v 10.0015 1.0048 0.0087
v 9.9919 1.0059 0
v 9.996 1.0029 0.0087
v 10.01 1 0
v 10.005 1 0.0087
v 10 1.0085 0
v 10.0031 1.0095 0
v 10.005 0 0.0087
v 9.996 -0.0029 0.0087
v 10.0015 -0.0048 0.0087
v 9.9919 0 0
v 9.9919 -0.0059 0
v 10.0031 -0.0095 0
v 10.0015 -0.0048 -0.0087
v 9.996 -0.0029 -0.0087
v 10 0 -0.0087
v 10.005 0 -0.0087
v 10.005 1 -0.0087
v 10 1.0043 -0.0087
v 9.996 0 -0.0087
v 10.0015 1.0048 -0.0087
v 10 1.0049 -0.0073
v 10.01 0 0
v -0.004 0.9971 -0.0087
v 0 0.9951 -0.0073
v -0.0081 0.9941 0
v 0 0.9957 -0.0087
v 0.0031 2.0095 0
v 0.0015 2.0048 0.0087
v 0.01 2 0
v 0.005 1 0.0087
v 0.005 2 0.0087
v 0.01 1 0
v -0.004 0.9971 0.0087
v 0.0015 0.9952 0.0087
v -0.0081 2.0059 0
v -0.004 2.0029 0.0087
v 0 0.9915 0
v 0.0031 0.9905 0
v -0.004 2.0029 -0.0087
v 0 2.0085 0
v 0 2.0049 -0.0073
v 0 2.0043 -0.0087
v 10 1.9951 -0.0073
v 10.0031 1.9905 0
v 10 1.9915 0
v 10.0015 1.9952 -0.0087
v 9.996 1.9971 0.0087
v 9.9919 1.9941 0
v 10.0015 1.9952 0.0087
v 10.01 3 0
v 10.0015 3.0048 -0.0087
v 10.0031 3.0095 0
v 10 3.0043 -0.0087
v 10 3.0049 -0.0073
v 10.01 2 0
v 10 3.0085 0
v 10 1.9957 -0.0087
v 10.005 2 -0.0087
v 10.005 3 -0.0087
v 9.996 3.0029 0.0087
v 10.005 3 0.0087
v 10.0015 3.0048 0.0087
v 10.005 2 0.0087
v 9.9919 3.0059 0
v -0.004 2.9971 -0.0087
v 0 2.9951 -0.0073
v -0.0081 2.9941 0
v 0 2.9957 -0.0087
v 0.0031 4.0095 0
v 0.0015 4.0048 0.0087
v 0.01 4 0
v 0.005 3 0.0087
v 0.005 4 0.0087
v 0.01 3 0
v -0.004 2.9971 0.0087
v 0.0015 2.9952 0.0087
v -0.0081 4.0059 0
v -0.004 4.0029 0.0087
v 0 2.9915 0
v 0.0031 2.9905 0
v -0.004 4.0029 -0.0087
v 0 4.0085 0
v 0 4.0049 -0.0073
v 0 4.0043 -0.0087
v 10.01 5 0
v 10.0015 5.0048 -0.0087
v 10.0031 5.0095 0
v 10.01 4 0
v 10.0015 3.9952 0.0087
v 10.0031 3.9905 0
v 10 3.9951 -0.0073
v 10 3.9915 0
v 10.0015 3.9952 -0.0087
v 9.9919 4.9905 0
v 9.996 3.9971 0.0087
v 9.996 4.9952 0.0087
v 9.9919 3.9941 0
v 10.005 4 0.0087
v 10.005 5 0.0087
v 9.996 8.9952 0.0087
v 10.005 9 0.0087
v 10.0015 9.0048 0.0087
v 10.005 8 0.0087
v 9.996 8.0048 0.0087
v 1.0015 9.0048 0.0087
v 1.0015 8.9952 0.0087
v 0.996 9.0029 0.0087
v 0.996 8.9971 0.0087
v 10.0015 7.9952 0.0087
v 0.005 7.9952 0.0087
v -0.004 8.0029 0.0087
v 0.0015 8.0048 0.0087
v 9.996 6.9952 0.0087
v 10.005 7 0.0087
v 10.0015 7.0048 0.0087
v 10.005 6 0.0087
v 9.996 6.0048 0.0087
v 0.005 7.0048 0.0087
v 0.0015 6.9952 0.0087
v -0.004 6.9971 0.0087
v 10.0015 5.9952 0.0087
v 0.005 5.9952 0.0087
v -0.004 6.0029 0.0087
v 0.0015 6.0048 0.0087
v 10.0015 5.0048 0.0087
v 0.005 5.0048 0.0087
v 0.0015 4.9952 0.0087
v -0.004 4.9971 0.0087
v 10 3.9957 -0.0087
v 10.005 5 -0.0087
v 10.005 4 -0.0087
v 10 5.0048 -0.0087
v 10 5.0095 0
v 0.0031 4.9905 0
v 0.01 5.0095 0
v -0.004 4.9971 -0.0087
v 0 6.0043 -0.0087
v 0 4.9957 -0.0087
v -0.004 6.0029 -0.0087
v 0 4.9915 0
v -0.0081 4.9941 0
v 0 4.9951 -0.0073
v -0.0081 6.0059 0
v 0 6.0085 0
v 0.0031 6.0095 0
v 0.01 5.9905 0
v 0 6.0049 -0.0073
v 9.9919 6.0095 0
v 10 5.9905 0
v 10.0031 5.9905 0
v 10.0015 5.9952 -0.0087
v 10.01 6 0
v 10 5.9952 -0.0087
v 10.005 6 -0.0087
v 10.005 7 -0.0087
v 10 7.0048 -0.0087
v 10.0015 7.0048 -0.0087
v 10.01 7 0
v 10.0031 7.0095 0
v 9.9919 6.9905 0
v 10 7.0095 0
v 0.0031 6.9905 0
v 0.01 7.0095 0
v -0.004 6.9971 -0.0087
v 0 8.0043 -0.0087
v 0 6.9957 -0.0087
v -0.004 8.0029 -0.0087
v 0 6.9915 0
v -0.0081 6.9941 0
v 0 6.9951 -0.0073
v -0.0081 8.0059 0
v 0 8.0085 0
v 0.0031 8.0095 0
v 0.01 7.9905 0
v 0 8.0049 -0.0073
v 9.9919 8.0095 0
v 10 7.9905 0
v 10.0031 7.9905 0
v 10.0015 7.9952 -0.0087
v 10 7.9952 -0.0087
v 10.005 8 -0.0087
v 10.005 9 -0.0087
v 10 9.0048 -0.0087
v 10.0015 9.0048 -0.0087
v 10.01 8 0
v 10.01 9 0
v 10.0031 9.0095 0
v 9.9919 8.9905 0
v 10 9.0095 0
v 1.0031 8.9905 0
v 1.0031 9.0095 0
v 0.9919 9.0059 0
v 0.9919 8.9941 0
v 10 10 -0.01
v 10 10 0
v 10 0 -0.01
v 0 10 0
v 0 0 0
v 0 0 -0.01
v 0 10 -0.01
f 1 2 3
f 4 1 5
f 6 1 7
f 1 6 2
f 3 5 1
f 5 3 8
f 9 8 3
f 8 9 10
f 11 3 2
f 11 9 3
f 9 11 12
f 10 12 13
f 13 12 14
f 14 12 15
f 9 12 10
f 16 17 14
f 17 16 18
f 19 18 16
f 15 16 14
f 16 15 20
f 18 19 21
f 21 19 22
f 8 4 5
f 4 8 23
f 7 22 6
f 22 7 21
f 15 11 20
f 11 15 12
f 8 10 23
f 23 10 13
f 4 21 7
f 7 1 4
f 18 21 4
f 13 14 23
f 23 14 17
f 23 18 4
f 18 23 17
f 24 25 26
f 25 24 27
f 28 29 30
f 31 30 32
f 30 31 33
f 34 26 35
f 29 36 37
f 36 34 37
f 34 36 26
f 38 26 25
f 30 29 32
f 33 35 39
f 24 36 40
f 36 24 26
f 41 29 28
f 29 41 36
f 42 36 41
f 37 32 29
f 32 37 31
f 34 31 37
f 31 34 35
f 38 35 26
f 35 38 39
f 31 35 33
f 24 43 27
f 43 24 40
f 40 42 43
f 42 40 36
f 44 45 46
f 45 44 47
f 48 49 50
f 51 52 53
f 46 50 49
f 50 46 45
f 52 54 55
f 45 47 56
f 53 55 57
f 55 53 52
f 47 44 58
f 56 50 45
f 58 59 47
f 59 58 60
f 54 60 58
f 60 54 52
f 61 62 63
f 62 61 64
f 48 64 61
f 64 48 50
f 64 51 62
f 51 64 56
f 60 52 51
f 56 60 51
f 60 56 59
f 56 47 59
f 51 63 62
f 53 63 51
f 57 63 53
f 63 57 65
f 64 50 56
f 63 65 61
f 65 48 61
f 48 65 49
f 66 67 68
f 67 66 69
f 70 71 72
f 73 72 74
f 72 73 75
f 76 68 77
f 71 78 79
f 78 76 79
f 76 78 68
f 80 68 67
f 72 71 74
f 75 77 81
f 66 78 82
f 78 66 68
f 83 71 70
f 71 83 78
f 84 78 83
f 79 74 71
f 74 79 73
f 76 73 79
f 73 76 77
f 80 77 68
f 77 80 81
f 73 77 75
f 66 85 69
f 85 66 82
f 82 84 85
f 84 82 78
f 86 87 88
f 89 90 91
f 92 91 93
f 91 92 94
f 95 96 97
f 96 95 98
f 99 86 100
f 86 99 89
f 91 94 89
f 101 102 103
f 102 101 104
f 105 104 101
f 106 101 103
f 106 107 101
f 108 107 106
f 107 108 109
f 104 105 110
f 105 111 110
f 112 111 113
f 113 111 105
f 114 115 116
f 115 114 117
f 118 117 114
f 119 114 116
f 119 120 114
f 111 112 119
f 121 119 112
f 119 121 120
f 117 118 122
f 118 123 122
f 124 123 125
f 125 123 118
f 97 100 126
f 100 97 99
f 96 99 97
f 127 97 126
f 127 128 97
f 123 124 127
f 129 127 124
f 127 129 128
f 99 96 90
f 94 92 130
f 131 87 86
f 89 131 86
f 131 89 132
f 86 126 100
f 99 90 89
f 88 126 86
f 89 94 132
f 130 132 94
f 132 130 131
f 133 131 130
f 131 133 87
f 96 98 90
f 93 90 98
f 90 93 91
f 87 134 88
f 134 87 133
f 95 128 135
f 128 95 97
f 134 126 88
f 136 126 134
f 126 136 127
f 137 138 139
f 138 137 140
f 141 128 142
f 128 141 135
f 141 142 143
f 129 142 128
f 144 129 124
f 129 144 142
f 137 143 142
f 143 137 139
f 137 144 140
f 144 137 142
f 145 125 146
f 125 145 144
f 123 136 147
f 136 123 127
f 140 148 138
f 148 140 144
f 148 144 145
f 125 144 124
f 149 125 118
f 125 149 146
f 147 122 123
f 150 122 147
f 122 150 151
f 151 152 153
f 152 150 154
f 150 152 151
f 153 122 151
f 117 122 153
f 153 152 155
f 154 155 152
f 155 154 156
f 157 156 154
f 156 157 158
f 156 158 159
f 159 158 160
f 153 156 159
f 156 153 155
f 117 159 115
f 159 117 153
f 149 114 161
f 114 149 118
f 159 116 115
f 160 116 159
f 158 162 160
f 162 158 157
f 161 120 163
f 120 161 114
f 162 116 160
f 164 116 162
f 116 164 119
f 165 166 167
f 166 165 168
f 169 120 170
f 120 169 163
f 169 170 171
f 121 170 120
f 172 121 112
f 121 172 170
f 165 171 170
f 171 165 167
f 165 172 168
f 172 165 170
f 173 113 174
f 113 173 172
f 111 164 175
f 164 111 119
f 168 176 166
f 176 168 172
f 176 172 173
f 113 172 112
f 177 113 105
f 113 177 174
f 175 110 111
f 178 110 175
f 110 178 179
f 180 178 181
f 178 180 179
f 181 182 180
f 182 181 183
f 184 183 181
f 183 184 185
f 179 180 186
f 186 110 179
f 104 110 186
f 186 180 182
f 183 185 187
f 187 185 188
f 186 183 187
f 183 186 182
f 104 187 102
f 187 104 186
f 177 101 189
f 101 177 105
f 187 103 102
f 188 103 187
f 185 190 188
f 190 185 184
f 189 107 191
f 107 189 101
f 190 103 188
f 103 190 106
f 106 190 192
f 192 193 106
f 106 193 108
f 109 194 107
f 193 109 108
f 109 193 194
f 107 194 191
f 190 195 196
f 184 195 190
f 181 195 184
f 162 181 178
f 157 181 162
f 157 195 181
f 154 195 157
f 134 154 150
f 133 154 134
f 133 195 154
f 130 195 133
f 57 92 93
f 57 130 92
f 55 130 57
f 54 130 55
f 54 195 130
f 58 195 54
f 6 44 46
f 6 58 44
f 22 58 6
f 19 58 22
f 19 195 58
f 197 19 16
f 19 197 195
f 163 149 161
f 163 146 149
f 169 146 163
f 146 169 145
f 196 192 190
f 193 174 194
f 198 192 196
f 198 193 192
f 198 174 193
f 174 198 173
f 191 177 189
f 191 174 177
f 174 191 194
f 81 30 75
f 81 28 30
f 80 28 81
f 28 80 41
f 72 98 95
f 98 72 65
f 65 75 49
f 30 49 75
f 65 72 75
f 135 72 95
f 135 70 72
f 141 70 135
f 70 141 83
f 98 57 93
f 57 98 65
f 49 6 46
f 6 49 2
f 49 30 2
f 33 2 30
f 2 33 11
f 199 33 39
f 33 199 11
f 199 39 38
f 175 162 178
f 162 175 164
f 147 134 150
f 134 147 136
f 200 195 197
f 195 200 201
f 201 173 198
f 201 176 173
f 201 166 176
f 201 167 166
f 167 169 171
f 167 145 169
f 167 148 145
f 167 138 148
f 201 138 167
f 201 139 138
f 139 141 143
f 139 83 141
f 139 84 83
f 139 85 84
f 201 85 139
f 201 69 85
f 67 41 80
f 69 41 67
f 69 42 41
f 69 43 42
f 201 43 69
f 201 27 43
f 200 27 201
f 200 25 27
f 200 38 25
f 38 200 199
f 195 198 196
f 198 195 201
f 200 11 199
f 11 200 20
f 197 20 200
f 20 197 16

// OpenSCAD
hull(){
    translate([10.0, 0.0]) sphere(0.01);
    translate([10.0, 1.0]) sphere(0.01);
}
hull(){
    translate([0.0, 1.0]) sphere(0.01);
    translate([0.0, 2.0]) sphere(0.01);
}
hull(){
    translate([10.0, 2.0]) sphere(0.01);
    translate([10.0, 3.0]) sphere(0.01);
}
hull(){
    translate([0.0, 3.0]) sphere(0.01);
    translate([0.0, 4.0]) sphere(0.01);
}
hull(){
    translate([10.0, 4.0]) sphere(0.01);
    translate([10.0, 5.0]) sphere(0.01);
}
hull(){
    translate([10.0, 5.0]) sphere(0.01);
    translate([9.0, 5.0]) sphere(0.01);
}
hull(){
    translate([9.0, 5.0]) sphere(0.01);
    translate([8.0, 5.0]) sphere(0.01);
}
hull(){
    translate([8.0, 5.0]) sphere(0.01);
    translate([7.0, 5.0]) sphere(0.01);
}
hull(){
    translate([7.0, 5.0]) sphere(0.01);
    translate([6.0, 5.0]) sphere(0.01);
}
hull(){
    translate([6.0, 5.0]) sphere(0.01);
    translate([5.0, 5.0]) sphere(0.01);
}
hull(){
    translate([5.0, 5.0]) sphere(0.01);
    translate([4.0, 5.0]) sphere(0.01);
}
hull(){
    translate([4.0, 5.0]) sphere(0.01);
    translate([3.0, 5.0]) sphere(0.01);
}
hull(){
    translate([3.0, 5.0]) sphere(0.01);
    translate([2.0, 5.0]) sphere(0.01);
}
hull(){
    translate([2.0, 5.0]) sphere(0.01);
    translate([1.0, 5.0]) sphere(0.01);
}
hull(){
    translate([1.0, 5.0]) sphere(0.01);
    translate([0.0, 5.0]) sphere(0.01);
}
hull(){
    translate([0.0, 5.0]) sphere(0.01);
    translate([0.0, 6.0]) sphere(0.01);
}
hull(){
    translate([0.0, 6.0]) sphere(0.01);
    translate([1.0, 6.0]) sphere(0.01);
}
hull(){
    translate([1.0, 6.0]) sphere(0.01);
    translate([2.0, 6.0]) sphere(0.01);
}
hull(){
    translate([2.0, 6.0]) sphere(0.01);
    translate([3.0, 6.0]) sphere(0.01);
}
hull(){
    translate([3.0, 6.0]) sphere(0.01);
    translate([4.0, 6.0]) sphere(0.01);
}
hull(){
    translate([4.0, 6.0]) sphere(0.01);
    translate([5.0, 6.0]) sphere(0.01);
}
hull(){
    translate([5.0, 6.0]) sphere(0.01);
    translate([6.0, 6.0]) sphere(0.01);
}
hull(){
    translate([6.0, 6.0]) sphere(0.01);
    translate([7.0, 6.0]) sphere(0.01);
}
hull(){
    translate([7.0, 6.0]) sphere(0.01);
    translate([8.0, 6.0]) sphere(0.01);
}
hull(){
    translate([8.0, 6.0]) sphere(0.01);
    translate([9.0, 6.0]) sphere(0.01);
}
hull(){
    translate([9.0, 6.0]) sphere(0.01);
    translate([10.0, 6.0]) sphere(0.01);
}
hull(){
    translate([10.0, 6.0]) sphere(0.01);
    translate([10.0, 7.0]) sphere(0.01);
}
hull(){
    translate([10.0, 7.0]) sphere(0.01);
    translate([9.0, 7.0]) sphere(0.01);
}
hull(){
    translate([9.0, 7.0]) sphere(0.01);
    translate([8.0, 7.0]) sphere(0.01);
}
hull(){
    translate([8.0, 7.0]) sphere(0.01);
    translate([7.0, 7.0]) sphere(0.01);
}
hull(){
    translate([7.0, 7.0]) sphere(0.01);
    translate([6.0, 7.0]) sphere(0.01);
}
hull(){
    translate([6.0, 7.0]) sphere(0.01);
    translate([5.0, 7.0]) sphere(0.01);
}
hull(){
    translate([5.0, 7.0]) sphere(0.01);
    translate([4.0, 7.0]) sphere(0.01);
}
hull(){
    translate([4.0, 7.0]) sphere(0.01);
    translate([3.0, 7.0]) sphere(0.01);
}
hull(){
    translate([3.0, 7.0]) sphere(0.01);
    translate([2.0, 7.0]) sphere(0.01);
}
hull(){
    translate([2.0, 7.0]) sphere(0.01);
    translate([1.0, 7.0]) sphere(0.01);
}
hull(){
    translate([1.0, 7.0]) sphere(0.01);
    translate([0.0, 7.0]) sphere(0.01);
}
hull(){
    translate([0.0, 7.0]) sphere(0.01);
    translate([0.0, 8.0]) sphere(0.01);
}
hull(){
    translate([0.0, 8.0]) sphere(0.01);
    translate([1.0, 8.0]) sphere(0.01);
}
hull(){
    translate([1.0, 8.0]) sphere(0.01);
    translate([2.0, 8.0]) sphere(0.01);
}
hull(){
    translate([2.0, 8.0]) sphere(0.01);
    translate([3.0, 8.0]) sphere(0.01);
}
hull(){
    translate([3.0, 8.0]) sphere(0.01);
    translate([4.0, 8.0]) sphere(0.01);
}
hull(){
    translate([4.0, 8.0]) sphere(0.01);
    translate([5.0, 8.0]) sphere(0.01);
}
hull(){
    translate([5.0, 8.0]) sphere(0.01);
    translate([6.0, 8.0]) sphere(0.01);
}
hull(){
    translate([6.0, 8.0]) sphere(0.01);
    translate([7.0, 8.0]) sphere(0.01);
}
hull(){
    translate([7.0, 8.0]) sphere(0.01);
    translate([8.0, 8.0]) sphere(0.01);
}
hull(){
    translate([8.0, 8.0]) sphere(0.01);
    translate([9.0, 8.0]) sphere(0.01);
}
hull(){
    translate([9.0, 8.0]) sphere(0.01);
    translate([10.0, 8.0]) sphere(0.01);
}
hull(){
    translate([10.0, 8.0]) sphere(0.01);
    translate([10.0, 9.0]) sphere(0.01);
}
hull(){
    translate([10.0, 9.0]) sphere(0.01);
    translate([9.0, 9.0]) sphere(0.01);
}
hull(){
    translate([9.0, 9.0]) sphere(0.01);
    translate([8.0, 9.0]) sphere(0.01);
}
hull(){
    translate([8.0, 9.0]) sphere(0.01);
    translate([7.0, 9.0]) sphere(0.01);
}
hull(){
    translate([7.0, 9.0]) sphere(0.01);
    translate([6.0, 9.0]) sphere(0.01);
}
hull(){
    translate([6.0, 9.0]) sphere(0.01);
    translate([5.0, 9.0]) sphere(0.01);
}
hull(){
    translate([5.0, 9.0]) sphere(0.01);
    translate([4.0, 9.0]) sphere(0.01);
}
hull(){
    translate([4.0, 9.0]) sphere(0.01);
    translate([3.0, 9.0]) sphere(0.01);
}
hull(){
    translate([3.0, 9.0]) sphere(0.01);
    translate([2.0, 9.0]) sphere(0.01);
}
hull(){
    translate([2.0, 9.0]) sphere(0.01);
    translate([1.0, 9.0]) sphere(0.01);
}
translate([0,0,-0.01]) color([0.1,0.1,0.1]) cube([10,10,0.01]);
